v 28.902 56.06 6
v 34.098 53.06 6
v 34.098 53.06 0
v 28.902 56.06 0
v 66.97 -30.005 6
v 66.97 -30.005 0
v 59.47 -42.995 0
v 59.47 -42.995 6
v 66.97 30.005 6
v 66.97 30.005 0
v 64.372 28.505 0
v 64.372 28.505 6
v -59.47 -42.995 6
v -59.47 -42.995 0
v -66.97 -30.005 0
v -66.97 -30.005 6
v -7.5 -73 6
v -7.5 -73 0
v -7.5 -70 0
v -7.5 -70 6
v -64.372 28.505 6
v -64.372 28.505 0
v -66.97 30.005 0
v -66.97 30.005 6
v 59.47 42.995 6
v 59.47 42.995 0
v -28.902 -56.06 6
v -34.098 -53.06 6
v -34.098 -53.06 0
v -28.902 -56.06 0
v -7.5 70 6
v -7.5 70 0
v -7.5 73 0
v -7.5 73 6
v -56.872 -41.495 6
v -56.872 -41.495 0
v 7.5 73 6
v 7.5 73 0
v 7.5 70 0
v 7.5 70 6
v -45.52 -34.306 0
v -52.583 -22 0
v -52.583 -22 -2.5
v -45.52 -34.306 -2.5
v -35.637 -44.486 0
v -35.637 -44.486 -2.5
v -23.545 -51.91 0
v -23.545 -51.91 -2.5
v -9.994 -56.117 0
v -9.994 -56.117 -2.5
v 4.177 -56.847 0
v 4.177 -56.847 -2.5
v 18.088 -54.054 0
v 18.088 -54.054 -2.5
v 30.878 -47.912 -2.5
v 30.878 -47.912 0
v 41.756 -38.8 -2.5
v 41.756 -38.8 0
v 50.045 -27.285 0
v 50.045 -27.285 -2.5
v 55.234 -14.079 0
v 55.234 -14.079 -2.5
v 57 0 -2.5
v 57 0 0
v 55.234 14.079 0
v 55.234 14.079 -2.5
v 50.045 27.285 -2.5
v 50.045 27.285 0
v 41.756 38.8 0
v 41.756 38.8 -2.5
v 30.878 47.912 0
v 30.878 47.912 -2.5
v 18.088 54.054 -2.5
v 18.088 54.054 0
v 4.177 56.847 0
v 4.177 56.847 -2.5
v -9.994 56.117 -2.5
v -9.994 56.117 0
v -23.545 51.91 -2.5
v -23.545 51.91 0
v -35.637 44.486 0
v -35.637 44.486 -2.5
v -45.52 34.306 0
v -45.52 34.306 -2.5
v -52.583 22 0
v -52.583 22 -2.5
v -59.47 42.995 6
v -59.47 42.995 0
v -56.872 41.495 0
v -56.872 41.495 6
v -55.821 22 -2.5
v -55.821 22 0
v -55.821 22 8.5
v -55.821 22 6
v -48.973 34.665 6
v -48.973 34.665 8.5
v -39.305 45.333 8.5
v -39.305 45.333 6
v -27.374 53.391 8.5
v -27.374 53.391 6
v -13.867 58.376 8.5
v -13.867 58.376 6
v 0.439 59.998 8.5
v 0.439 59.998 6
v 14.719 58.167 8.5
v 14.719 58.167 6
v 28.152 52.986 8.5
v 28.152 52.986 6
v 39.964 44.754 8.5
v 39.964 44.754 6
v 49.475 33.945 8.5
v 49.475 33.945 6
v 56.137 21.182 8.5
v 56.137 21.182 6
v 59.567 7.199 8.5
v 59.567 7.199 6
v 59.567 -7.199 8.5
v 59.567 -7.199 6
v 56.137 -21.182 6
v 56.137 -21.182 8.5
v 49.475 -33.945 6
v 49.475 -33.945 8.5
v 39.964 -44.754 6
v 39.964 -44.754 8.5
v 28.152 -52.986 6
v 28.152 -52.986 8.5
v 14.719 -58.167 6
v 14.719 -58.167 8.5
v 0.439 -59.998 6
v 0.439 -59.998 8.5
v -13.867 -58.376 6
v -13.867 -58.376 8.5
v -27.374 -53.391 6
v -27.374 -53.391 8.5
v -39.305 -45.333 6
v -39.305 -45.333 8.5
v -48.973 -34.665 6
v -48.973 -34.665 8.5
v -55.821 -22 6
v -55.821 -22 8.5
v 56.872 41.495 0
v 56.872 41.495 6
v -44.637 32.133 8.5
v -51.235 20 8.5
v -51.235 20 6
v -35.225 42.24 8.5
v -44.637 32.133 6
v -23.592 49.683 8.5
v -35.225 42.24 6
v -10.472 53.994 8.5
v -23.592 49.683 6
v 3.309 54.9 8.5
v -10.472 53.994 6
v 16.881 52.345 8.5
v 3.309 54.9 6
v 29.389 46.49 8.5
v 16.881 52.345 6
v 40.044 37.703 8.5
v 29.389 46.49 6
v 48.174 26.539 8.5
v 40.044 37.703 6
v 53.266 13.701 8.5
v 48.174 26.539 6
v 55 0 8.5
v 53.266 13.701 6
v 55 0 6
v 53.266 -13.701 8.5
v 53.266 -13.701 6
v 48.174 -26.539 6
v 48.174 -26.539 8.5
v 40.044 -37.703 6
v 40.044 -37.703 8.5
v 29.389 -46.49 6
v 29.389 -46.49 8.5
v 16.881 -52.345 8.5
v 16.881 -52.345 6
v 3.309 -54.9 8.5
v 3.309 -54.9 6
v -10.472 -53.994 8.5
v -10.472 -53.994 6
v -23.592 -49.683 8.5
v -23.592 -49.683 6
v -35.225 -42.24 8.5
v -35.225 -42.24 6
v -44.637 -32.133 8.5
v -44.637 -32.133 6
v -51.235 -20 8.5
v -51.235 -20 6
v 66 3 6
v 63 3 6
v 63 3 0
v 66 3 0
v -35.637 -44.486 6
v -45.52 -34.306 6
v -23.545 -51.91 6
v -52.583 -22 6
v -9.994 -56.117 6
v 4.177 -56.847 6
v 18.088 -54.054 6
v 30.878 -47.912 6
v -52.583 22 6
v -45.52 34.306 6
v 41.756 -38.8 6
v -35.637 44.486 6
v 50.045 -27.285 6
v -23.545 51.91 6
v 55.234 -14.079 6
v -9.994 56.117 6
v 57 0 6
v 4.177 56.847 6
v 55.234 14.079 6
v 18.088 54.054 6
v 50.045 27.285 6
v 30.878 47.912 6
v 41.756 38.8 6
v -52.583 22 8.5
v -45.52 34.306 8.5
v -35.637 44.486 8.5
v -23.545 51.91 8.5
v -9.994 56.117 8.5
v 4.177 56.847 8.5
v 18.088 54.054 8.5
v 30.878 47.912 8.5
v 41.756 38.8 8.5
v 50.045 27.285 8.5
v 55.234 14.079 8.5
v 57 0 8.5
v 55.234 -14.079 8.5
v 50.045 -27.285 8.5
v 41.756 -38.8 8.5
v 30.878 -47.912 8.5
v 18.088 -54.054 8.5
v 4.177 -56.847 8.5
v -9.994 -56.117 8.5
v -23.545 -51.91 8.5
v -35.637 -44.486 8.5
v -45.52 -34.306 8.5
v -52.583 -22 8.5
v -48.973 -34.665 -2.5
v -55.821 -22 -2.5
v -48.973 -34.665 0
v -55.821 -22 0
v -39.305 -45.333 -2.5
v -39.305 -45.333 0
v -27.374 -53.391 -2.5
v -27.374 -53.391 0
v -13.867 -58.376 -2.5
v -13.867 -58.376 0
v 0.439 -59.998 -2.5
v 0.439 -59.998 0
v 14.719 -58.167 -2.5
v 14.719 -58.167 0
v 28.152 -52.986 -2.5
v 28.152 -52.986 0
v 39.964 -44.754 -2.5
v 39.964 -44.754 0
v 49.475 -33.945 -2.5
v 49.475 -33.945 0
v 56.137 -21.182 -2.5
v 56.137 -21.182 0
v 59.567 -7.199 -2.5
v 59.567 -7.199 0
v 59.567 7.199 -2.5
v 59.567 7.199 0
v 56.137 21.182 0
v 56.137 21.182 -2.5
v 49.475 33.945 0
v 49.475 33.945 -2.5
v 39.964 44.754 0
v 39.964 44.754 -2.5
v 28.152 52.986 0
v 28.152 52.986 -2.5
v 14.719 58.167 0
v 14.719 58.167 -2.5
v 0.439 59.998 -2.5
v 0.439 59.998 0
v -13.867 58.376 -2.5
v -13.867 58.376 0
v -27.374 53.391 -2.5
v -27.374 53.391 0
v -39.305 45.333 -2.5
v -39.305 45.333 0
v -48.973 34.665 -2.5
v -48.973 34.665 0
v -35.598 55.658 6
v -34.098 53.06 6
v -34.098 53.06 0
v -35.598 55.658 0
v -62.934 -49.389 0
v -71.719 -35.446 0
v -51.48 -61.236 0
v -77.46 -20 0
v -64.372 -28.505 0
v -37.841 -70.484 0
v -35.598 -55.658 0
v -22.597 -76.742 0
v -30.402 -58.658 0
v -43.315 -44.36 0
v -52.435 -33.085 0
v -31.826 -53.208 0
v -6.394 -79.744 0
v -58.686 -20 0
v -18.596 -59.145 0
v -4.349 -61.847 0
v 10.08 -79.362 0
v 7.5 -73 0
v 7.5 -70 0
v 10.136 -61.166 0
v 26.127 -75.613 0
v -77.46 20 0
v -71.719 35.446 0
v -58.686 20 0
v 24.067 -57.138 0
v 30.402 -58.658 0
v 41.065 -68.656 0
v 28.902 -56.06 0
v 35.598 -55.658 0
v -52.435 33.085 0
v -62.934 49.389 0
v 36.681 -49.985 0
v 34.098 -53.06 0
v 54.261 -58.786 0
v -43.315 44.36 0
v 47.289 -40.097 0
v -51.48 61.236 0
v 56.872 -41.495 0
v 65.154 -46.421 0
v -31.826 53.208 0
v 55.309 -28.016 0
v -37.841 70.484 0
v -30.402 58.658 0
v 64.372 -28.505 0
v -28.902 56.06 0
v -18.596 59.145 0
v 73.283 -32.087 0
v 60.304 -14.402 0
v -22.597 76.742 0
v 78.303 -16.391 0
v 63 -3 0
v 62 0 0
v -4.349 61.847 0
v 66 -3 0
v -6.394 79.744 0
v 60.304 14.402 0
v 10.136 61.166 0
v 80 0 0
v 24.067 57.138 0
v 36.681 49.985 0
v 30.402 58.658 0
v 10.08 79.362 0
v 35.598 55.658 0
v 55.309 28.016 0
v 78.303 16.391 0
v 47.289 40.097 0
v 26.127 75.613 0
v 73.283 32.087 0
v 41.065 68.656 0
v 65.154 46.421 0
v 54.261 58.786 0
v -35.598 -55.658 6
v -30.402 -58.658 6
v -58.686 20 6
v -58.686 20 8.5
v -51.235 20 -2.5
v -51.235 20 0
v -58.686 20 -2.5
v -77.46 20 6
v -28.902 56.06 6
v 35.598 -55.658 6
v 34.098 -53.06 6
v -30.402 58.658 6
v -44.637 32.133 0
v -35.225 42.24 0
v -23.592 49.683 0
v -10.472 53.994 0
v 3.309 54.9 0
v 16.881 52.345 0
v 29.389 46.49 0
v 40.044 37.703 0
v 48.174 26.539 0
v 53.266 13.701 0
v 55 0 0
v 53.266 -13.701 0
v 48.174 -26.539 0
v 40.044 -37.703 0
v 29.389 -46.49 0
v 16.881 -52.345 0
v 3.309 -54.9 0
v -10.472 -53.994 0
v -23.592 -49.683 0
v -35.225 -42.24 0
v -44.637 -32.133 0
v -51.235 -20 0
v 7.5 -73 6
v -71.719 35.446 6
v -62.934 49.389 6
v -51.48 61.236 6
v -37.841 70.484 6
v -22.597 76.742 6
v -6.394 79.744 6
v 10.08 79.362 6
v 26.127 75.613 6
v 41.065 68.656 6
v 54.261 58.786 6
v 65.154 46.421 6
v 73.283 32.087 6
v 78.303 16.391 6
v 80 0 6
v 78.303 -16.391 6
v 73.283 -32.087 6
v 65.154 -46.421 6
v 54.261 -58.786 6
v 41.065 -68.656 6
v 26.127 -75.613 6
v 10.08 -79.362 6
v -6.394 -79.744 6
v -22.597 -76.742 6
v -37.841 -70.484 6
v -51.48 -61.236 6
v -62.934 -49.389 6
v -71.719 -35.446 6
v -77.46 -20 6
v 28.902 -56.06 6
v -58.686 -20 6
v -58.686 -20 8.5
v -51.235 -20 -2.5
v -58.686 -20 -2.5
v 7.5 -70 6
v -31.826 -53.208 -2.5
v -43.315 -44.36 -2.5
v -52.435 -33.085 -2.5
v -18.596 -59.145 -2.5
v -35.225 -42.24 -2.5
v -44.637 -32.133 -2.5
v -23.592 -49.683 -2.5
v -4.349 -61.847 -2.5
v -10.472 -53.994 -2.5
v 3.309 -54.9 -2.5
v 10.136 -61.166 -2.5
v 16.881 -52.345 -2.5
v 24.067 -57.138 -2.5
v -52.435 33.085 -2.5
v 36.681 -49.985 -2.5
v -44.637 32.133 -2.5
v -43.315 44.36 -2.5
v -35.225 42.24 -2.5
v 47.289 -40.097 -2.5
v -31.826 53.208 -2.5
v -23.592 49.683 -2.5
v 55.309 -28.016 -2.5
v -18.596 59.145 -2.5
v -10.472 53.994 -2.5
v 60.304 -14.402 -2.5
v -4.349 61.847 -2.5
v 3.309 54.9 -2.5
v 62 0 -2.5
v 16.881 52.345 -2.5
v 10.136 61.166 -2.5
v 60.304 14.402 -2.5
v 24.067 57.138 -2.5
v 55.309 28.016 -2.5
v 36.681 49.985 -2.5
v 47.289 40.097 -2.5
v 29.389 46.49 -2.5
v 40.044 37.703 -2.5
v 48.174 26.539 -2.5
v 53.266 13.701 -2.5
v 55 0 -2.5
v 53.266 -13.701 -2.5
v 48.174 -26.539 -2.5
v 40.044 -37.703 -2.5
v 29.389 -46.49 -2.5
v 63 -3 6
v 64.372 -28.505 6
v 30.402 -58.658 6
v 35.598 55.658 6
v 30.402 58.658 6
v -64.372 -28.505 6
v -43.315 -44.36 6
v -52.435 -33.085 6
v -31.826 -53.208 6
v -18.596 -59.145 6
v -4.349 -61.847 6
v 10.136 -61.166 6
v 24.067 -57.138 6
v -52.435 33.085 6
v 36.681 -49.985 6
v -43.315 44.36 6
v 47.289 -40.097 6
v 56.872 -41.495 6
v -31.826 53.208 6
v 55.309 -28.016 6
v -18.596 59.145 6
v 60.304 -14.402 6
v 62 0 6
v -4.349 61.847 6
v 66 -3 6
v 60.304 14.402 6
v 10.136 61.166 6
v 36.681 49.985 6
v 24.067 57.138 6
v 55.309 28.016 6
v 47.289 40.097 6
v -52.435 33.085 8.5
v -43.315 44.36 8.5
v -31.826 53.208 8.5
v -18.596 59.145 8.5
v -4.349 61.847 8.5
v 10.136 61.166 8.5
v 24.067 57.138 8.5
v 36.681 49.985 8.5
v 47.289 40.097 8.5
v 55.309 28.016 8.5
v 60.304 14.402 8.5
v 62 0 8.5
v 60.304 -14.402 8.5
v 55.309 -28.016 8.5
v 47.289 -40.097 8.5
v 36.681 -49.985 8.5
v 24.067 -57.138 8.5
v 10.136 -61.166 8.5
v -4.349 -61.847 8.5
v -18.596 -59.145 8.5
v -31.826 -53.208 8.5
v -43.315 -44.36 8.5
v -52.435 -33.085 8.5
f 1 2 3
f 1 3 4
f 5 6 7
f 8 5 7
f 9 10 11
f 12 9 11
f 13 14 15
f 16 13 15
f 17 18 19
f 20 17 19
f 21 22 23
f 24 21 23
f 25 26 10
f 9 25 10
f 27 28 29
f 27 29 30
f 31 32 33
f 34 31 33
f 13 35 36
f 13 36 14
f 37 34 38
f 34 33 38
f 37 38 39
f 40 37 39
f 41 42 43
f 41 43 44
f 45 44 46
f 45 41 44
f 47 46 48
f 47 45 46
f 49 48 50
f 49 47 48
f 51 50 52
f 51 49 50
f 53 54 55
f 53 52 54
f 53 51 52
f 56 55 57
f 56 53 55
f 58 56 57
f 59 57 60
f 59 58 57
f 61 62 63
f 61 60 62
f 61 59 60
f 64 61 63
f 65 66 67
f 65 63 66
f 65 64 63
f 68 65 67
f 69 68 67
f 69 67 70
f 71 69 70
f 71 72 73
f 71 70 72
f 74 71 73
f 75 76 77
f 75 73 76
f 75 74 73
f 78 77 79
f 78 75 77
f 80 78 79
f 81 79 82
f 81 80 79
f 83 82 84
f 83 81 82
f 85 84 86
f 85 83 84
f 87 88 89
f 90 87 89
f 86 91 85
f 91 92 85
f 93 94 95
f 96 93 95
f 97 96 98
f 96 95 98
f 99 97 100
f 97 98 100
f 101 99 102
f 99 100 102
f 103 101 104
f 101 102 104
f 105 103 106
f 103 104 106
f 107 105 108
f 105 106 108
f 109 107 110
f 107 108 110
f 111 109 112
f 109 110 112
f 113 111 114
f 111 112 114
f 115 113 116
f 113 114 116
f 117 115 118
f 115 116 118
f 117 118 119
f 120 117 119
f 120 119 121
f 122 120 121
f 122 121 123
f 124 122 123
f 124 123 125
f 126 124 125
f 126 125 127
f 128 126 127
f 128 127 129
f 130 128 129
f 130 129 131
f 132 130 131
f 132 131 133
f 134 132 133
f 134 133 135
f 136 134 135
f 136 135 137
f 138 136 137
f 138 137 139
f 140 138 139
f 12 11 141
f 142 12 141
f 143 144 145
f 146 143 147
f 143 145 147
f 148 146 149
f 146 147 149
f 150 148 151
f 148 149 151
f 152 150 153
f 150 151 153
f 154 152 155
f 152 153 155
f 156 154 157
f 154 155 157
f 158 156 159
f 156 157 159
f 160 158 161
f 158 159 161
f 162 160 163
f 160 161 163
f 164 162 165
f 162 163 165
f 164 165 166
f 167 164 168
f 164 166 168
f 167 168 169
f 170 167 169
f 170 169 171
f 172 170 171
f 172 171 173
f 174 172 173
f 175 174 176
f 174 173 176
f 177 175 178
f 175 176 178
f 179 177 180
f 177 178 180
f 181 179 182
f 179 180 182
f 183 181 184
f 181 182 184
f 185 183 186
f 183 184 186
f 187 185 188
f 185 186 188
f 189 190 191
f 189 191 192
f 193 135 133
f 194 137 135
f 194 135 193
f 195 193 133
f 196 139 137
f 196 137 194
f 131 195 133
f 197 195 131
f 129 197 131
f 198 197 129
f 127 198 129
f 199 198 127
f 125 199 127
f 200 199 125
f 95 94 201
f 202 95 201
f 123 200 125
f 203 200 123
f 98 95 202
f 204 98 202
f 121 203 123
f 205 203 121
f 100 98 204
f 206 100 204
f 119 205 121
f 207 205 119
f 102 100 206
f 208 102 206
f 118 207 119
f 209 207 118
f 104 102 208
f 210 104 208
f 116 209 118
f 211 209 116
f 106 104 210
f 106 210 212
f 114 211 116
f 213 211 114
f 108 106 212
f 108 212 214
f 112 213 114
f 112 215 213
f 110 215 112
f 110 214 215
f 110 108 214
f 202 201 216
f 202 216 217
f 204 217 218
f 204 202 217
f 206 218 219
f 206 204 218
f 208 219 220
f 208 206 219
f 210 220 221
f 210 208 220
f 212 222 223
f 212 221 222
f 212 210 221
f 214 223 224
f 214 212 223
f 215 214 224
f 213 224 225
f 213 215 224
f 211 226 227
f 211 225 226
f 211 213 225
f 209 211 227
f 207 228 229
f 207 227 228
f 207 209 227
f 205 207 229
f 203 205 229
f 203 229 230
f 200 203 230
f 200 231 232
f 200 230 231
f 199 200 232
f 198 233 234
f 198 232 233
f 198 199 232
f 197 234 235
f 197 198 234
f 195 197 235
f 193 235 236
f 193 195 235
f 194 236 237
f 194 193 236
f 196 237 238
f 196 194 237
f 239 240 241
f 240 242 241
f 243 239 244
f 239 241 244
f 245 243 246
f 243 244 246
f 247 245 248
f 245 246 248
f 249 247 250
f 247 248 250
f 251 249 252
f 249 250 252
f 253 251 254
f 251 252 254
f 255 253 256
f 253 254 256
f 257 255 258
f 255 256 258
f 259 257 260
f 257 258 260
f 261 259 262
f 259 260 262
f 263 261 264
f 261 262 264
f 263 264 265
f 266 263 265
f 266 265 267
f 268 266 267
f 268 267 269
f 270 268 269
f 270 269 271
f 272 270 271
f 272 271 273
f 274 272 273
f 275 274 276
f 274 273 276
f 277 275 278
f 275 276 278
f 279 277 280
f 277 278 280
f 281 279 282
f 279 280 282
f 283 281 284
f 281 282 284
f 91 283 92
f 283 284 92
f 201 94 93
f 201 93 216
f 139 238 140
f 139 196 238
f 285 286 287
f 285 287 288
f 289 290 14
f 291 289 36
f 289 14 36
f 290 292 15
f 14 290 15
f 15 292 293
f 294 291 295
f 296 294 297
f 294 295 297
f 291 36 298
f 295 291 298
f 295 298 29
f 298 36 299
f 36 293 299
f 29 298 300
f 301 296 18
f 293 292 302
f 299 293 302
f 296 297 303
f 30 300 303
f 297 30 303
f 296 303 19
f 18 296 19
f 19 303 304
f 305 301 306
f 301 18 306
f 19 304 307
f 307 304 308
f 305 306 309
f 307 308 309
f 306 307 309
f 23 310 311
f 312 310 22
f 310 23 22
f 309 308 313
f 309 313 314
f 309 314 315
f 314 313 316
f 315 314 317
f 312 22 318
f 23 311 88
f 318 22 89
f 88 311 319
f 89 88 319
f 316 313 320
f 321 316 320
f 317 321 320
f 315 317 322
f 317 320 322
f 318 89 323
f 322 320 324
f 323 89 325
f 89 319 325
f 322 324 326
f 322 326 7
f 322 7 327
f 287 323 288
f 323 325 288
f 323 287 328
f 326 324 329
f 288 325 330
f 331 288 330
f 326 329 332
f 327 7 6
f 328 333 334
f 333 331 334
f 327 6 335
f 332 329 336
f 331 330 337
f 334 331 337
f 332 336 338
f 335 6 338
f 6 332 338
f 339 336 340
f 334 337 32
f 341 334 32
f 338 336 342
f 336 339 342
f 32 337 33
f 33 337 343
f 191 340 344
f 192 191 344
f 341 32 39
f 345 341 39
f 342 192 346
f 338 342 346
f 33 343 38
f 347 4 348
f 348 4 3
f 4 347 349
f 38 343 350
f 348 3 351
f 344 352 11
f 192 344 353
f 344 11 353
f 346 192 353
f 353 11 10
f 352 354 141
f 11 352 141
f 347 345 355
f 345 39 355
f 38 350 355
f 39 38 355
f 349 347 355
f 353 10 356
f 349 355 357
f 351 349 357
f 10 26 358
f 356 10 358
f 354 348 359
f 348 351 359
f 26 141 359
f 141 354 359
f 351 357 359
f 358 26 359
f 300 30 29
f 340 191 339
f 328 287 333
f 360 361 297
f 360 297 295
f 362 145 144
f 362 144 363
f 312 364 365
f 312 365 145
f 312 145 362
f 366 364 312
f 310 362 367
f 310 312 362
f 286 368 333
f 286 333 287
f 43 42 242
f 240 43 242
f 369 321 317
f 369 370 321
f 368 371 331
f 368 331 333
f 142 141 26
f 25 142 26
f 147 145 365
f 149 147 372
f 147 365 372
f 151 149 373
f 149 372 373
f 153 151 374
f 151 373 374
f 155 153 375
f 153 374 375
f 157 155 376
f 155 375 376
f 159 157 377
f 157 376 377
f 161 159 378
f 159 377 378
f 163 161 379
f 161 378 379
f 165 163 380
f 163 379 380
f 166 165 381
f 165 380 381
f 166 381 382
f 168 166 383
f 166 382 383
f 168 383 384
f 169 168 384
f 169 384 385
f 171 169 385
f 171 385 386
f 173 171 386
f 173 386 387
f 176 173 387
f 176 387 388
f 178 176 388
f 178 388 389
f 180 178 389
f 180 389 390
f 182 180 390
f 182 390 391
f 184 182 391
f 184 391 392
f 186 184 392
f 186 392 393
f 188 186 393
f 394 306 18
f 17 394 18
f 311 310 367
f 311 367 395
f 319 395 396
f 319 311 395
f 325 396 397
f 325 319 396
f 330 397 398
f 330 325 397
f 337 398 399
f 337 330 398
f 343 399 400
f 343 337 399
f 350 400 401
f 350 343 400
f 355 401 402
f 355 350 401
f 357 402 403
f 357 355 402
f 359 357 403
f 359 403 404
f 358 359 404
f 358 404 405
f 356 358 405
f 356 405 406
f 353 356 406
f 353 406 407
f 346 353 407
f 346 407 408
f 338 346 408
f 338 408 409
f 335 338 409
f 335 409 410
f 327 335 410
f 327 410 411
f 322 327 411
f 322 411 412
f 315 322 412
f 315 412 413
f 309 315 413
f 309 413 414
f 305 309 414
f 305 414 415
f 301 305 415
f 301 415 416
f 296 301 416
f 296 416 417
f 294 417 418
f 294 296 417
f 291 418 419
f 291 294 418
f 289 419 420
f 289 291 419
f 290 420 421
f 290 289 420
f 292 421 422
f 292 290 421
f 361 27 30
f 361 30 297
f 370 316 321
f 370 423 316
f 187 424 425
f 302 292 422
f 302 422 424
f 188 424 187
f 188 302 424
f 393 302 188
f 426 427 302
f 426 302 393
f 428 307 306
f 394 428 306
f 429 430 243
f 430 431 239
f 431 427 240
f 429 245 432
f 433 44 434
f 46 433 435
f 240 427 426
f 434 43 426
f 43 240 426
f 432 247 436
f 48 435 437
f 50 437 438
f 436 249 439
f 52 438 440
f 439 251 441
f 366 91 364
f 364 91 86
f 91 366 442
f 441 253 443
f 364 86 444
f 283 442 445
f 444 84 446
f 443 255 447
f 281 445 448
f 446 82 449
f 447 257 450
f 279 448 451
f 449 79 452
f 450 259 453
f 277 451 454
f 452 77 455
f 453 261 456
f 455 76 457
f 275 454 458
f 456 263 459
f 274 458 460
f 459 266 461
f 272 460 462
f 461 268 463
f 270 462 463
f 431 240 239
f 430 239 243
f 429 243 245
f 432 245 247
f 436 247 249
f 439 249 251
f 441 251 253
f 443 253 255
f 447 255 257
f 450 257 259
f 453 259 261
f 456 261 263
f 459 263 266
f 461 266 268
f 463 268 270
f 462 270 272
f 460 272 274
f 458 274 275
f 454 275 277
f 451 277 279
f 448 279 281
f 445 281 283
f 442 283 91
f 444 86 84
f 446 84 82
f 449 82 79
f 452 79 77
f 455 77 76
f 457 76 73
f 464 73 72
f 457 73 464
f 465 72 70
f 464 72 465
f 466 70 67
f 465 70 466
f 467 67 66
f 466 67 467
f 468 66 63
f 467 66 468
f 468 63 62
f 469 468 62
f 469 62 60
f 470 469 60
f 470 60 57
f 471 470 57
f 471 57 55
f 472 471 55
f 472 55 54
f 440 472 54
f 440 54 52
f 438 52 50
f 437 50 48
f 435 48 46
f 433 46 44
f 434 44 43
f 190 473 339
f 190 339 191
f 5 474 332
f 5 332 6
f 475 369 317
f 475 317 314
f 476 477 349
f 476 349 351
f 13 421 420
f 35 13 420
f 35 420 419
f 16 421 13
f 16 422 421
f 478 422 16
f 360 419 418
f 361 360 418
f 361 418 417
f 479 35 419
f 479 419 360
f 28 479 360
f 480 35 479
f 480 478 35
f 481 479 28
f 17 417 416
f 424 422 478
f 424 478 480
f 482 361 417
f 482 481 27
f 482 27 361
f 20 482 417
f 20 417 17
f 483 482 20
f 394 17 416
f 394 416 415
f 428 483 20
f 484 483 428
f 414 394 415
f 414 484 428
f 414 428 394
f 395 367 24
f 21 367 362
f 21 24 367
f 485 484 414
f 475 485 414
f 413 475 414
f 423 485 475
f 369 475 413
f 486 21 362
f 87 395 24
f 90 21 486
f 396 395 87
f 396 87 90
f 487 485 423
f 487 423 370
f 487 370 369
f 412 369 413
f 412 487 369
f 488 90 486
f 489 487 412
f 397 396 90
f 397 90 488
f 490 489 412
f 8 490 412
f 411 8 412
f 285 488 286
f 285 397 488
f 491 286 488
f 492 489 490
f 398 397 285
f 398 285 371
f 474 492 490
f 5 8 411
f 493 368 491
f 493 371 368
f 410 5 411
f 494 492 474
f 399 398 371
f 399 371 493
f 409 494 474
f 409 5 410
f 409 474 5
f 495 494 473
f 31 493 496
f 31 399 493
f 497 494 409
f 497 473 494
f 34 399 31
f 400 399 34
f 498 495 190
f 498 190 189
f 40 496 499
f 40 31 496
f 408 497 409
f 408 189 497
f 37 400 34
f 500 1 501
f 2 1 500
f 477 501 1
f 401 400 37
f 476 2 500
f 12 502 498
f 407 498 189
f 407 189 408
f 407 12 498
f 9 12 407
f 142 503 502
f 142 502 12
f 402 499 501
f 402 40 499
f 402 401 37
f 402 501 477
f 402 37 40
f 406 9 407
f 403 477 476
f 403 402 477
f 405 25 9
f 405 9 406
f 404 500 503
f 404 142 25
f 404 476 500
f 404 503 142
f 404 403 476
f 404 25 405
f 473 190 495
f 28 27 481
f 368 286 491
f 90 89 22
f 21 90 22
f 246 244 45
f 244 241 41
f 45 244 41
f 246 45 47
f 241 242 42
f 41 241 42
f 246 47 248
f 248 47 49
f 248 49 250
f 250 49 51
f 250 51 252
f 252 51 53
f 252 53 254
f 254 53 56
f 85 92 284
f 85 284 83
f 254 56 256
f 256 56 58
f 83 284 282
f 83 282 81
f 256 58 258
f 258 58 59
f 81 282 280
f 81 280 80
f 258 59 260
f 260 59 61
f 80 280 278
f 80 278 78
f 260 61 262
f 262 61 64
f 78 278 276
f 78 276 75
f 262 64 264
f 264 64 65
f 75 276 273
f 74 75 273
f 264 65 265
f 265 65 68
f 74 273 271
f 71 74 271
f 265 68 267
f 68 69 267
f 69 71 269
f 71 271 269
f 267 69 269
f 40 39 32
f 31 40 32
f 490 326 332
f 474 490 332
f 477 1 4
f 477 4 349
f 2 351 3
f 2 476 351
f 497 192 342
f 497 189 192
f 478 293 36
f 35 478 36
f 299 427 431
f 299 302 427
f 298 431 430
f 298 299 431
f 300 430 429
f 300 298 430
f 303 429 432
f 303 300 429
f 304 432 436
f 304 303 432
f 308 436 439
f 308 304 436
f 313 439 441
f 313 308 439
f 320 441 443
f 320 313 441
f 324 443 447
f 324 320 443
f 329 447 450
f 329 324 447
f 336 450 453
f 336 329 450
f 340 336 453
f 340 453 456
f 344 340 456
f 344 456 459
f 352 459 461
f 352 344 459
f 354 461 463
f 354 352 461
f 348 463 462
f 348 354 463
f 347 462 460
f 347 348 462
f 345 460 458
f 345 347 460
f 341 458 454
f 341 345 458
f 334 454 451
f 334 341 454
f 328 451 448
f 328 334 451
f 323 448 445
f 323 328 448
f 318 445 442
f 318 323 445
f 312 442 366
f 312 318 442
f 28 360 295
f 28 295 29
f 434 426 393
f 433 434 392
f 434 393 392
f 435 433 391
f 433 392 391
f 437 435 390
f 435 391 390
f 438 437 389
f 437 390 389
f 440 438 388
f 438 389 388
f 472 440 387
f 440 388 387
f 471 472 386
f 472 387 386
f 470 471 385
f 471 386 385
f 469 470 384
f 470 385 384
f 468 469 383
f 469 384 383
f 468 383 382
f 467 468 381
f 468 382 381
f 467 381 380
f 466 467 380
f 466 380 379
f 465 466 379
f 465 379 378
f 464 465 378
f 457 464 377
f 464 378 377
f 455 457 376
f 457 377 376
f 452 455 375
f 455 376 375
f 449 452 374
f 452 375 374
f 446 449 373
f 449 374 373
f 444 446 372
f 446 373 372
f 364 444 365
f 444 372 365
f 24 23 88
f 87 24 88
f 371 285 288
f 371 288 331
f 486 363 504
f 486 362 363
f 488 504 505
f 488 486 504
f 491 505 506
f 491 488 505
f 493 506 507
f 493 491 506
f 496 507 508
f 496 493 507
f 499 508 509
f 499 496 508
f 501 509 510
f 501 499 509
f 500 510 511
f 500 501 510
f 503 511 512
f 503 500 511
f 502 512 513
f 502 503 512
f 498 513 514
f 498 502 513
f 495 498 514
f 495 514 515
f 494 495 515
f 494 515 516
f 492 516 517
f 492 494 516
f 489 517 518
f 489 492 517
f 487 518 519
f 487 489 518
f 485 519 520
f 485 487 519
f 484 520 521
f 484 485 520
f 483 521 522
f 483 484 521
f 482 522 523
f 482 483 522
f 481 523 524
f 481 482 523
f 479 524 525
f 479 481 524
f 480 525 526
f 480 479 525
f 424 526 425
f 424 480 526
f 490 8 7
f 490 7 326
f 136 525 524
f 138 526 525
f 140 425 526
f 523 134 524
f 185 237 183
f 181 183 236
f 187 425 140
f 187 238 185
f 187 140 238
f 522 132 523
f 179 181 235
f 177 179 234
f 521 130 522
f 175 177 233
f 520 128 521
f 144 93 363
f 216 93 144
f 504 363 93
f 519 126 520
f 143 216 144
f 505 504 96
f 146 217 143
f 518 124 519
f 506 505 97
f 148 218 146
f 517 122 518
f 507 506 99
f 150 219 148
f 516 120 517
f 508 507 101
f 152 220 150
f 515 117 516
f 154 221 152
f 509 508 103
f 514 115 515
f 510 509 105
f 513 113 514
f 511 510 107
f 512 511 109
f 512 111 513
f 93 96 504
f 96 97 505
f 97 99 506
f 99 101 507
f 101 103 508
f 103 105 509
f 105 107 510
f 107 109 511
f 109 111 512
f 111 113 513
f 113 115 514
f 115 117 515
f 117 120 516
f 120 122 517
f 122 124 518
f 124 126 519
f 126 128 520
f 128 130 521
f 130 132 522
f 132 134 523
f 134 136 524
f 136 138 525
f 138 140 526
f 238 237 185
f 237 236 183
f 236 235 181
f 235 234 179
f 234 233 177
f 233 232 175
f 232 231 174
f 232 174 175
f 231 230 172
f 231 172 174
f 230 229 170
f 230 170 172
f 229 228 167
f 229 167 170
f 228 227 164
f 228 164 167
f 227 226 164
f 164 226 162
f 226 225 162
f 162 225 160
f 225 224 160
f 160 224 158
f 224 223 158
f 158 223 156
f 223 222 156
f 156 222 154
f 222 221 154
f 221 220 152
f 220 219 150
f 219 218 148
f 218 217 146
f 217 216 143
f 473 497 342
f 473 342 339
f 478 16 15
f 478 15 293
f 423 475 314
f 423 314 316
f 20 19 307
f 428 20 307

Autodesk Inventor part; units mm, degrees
ref_plane "YZ Plane" through (0, 0, 0) normal (1, 0, 0) x (0, 1, 0)
ref_plane "XZ Plane" through (0, 0, 0) normal (0, 1, 0) x (-1, 0, 0)
ref_plane "XY Plane" through (0, 0, 0) normal (0, 0, 1) x (1, 0, 0)
sketch "Sketch1" plane through (0, 0, 0) normal (0, 0, 1) x (1, 0, 0)
  circle A0 centre (0, 0) radius 80
  circle A1 centre (0, 0) radius 55
  line L0 (-7.5, 73) -> (7.5, 73)
  line L1 (7.5, 73) -> (7.5, 70)
  line L2 (7.5, 70) -> (-7.5, 70)
  line L3 (-7.5, 70) -> (-7.5, 73)
  line L4 (-66.9699, 30.0048) -> (-59.4699, 42.9952)
  line L5 (-59.4699, 42.9952) -> (-56.8718, 41.4952)
  line L6 (-56.8718, 41.4952) -> (-64.3718, 28.5048)
  line L7 (-64.3718, 28.5048) -> (-66.9699, 30.0048)
  line L8 (-59.4699, -42.9952) -> (-66.9699, -30.0048)
  line L9 (-66.9699, -30.0048) -> (-64.3718, -28.5048)
  line L10 (-64.3718, -28.5048) -> (-56.8718, -41.4952)
  line L11 (-56.8718, -41.4952) -> (-59.4699, -42.9952)
  line L12 (7.5, -73) -> (-7.5, -73)
  line L13 (-7.5, -73) -> (-7.5, -70)
  line L14 (-7.5, -70) -> (7.5, -70)
  line L15 (7.5, -70) -> (7.5, -73)
  line L16 (66.9699, -30.0048) -> (59.4699, -42.9952)
  line L17 (59.4699, -42.9952) -> (56.8718, -41.4952)
  line L18 (56.8718, -41.4952) -> (64.3718, -28.5048)
  line L19 (64.3718, -28.5048) -> (66.9699, -30.0048)
  line L20 (59.4699, 42.9952) -> (66.9699, 30.0048)
  line L21 (66.9699, 30.0048) -> (64.3718, 28.5048)
  line L22 (64.3718, 28.5048) -> (56.8718, 41.4952)
  line L23 (56.8718, 41.4952) -> (59.4699, 42.9952)
  line L24 (-58.1708, 43.7452) -> (-43.1708, 43.7452)
  line L25 (-43.1708, 43.7452) -> (-43.1708, 40.7452)
  line L26 (-43.1708, 40.7452) -> (-58.1708, 40.7452)
  line L27 (-58.1708, 40.7452) -> (-58.1708, 43.7452)
  line L28 (-58.1708, -40.7452) -> (-43.1708, -40.7452)
  line L29 (-43.1708, -40.7452) -> (-43.1708, -43.7452)
  line L30 (-43.1708, -43.7452) -> (-58.1708, -43.7452)
  line L31 (-58.1708, -43.7452) -> (-58.1708, -40.7452)
  line L32 (0, 20) -> (-100, 20)
  line L33 (-100, 20) -> (-100, -20)
  line L34 (-100, -20) -> (0, -20)
  line L35 (0, -20) -> (0, 20)
  point P0 (0, 73)
  point P1 (7.5, 71.5)
  point P2 (0, 70)
  point P3 (-63.2199, 36.5)
  point P4 (-58.1708, 42.2452)
  point P5 (-60.6218, 35)
  point P6 (-63.2199, -36.5)
  point P7 (-65.6708, -29.2548)
  point P8 (-60.6218, -35)
  point P9 (0, -73)
  point P10 (-7.5, -71.5)
  point P11 (0, -70)
  point P12 (63.2199, -36.5)
  point P13 (58.1708, -42.2452)
  point P14 (60.6218, -35)
  point P15 (63.2199, 36.5)
  point P16 (65.6708, 29.2548)
  point P17 (60.6218, 35)
  point P18 (-58.1708, 42.2452)
  point P19 (-58.1708, -42.2452)
  point P20 (-51.2348, -20)
  point P21 (-77.4597, -20)
  point P22 (-77.4597, 20)
  point P23 (-51.2348, 20)
  dimension "d0" = 160
  dimension "d1" = 110
  dimension "d2" = 15
  dimension "d3" = 3
  dimension "d11" = 70
  dimension "d14" = 360
  dimension "d18" = 15
  dimension "d19" = 3
  dimension "d20" = 15
  dimension "d21" = 3
  dimension "d22" = 40
  dimension "d23" = 100
extrude "Extrusion2" add sketch "Sketch1" along normal blind 6 contours A0 L34 A1 L32 | L27 L24 L25 L26 L6 L5 | L11 L10 L28 L29 L30 L31 picked at (16.7927, -65.9701)
sketch "草圖2" plane through (0, 0, 6) normal (0, 0, 1) x (1, 0, 0)
  arc A0 (-51.2348, -20) -> (-51.2348, 20) centre (0, 0) ccw projected
  circle A1 centre (0, 0) radius 55
  circle A2 centre (0, 0) radius 57
  circle A3 centre (0, 0) radius 60
  circle A4 centre (0, 0) radius 62
  arc A5 (-77.4597, -20) -> (-77.4597, 20) centre (0, 0) ccw projected
  line L0 (-51.2348, 20) -> (-77.4597, 20)
  line L1 (-51.2348, -20) -> (-77.4597, -20) projected
  line L2 (-51.2348, -20) -> (-77.4597, -20)
  line L3 (-51.2348, 20) -> (-77.4597, 20)
  line L4 (-77.4597, 20) -> (-77.4597, 22)
  line L5 (-77.4597, 22) -> (-51.2348, 22)
  line L6 (-51.2348, 22) -> (-51.2348, 20)
  line L7 (-77.4597, -20) -> (-51.2348, -20)
  line L8 (-51.2348, -20) -> (-51.2348, -22)
  line L9 (-51.2348, -22) -> (-77.4597, -22)
  line L10 (-77.4597, -22) -> (-77.4597, -20)
  point P0 (-58.6856, 20)
  point P1 (-58.6856, -20)
  point P2 (-55.8211, 22)
  point P3 (-55.8211, -22)
  point P4 (-52.5833, -22)
  point P5 (-52.5833, 22)
  dimension "d24" = 114
  dimension "d25" = 120
  dimension "d26" = 124
  dimension "d27" = 2
  dimension "d28" = 26.2249
  dimension "d29" = 2
  dimension "d30" = 26.2249
extrude "擠出3" add sketch "草圖2" against normal blind 8.5 contours L8 L9 A2 L1 | A0 L6 L5 A2 L9 L8 | L0 A2 L5 L6 | A2 L9 A3 L1 | L0 A3 L5 A2 | A3 L9 A4 L1 | L0 A4 L5 A3 | A3 L5 A4 L9
extrude "擠出4" add sketch "草圖2" along normal blind 2.5 contours L8 L9 A2 L1 | A0 L6 L5 A2 L9 L8 | L0 A2 L5 L6 | A2 L9 A3 L1 | L0 A3 L5 A2 | A3 L9 A4 L1 | L0 A4 L5 A3 | A3 L5 A4 L9
sketch "草圖3" plane through (0, 0, 6) normal (0, 0, 1) x (1, 0, 0)
  line L0 (63, 3) -> (66, 3)
  line L1 (66, 3) -> (66, -3)
  line L2 (66, -3) -> (63, -3)
  line L3 (63, -3) -> (63, 3)
  line L4 (28.9019, 56.0596) -> (30.4019, 58.6577)
  line L5 (30.4019, 58.6577) -> (35.5981, 55.6577)
  line L6 (35.5981, 55.6577) -> (34.0981, 53.0596)
  line L7 (34.0981, 53.0596) -> (28.9019, 56.0596)
  line L8 (-34.0981, 53.0596) -> (-35.5981, 55.6577)
  line L9 (-35.5981, 55.6577) -> (-30.4019, 58.6577)
  line L10 (-30.4019, 58.6577) -> (-28.9019, 56.0596)
  line L11 (-28.9019, 56.0596) -> (-34.0981, 53.0596)
  line L12 (-63, -3) -> (-66, -3)
  line L13 (-66, -3) -> (-66, 3)
  line L14 (-66, 3) -> (-63, 3)
  line L15 (-63, 3) -> (-63, -3)
  line L16 (-28.9019, -56.0596) -> (-30.4019, -58.6577)
  line L17 (-30.4019, -58.6577) -> (-35.5981, -55.6577)
  line L18 (-35.5981, -55.6577) -> (-34.0981, -53.0596)
  line L19 (-34.0981, -53.0596) -> (-28.9019, -56.0596)
  line L20 (34.0981, -53.0596) -> (35.5981, -55.6577)
  line L21 (35.5981, -55.6577) -> (30.4019, -58.6577)
  line L22 (30.4019, -58.6577) -> (28.9019, -56.0596)
  line L23 (28.9019, -56.0596) -> (34.0981, -53.0596)
  point P0 (0, 0)
  point P1 (63, 0)
  point P2 (31.5, 54.5596)
  point P3 (-31.5, 54.5596)
  point P4 (-63, 0)
  point P5 (-31.5, -54.5596)
  point P6 (31.5, -54.5596)
  dimension "d42" = 3
  dimension "d43" = 6
  dimension "d44" = 63
  dimension "d47" = 360
extrude "擠出5" cut sketch "草圖3" against normal through all contours L0 L1 L2 L3 | L4 L5 L6 L7 | L8 L9 L10 L11 | L16 L17 L18 L19 | L20 L21 L22 L23
properties part number "[3DP]back_cir_hold_final" material "MDF Medium Density Fiberboard"
